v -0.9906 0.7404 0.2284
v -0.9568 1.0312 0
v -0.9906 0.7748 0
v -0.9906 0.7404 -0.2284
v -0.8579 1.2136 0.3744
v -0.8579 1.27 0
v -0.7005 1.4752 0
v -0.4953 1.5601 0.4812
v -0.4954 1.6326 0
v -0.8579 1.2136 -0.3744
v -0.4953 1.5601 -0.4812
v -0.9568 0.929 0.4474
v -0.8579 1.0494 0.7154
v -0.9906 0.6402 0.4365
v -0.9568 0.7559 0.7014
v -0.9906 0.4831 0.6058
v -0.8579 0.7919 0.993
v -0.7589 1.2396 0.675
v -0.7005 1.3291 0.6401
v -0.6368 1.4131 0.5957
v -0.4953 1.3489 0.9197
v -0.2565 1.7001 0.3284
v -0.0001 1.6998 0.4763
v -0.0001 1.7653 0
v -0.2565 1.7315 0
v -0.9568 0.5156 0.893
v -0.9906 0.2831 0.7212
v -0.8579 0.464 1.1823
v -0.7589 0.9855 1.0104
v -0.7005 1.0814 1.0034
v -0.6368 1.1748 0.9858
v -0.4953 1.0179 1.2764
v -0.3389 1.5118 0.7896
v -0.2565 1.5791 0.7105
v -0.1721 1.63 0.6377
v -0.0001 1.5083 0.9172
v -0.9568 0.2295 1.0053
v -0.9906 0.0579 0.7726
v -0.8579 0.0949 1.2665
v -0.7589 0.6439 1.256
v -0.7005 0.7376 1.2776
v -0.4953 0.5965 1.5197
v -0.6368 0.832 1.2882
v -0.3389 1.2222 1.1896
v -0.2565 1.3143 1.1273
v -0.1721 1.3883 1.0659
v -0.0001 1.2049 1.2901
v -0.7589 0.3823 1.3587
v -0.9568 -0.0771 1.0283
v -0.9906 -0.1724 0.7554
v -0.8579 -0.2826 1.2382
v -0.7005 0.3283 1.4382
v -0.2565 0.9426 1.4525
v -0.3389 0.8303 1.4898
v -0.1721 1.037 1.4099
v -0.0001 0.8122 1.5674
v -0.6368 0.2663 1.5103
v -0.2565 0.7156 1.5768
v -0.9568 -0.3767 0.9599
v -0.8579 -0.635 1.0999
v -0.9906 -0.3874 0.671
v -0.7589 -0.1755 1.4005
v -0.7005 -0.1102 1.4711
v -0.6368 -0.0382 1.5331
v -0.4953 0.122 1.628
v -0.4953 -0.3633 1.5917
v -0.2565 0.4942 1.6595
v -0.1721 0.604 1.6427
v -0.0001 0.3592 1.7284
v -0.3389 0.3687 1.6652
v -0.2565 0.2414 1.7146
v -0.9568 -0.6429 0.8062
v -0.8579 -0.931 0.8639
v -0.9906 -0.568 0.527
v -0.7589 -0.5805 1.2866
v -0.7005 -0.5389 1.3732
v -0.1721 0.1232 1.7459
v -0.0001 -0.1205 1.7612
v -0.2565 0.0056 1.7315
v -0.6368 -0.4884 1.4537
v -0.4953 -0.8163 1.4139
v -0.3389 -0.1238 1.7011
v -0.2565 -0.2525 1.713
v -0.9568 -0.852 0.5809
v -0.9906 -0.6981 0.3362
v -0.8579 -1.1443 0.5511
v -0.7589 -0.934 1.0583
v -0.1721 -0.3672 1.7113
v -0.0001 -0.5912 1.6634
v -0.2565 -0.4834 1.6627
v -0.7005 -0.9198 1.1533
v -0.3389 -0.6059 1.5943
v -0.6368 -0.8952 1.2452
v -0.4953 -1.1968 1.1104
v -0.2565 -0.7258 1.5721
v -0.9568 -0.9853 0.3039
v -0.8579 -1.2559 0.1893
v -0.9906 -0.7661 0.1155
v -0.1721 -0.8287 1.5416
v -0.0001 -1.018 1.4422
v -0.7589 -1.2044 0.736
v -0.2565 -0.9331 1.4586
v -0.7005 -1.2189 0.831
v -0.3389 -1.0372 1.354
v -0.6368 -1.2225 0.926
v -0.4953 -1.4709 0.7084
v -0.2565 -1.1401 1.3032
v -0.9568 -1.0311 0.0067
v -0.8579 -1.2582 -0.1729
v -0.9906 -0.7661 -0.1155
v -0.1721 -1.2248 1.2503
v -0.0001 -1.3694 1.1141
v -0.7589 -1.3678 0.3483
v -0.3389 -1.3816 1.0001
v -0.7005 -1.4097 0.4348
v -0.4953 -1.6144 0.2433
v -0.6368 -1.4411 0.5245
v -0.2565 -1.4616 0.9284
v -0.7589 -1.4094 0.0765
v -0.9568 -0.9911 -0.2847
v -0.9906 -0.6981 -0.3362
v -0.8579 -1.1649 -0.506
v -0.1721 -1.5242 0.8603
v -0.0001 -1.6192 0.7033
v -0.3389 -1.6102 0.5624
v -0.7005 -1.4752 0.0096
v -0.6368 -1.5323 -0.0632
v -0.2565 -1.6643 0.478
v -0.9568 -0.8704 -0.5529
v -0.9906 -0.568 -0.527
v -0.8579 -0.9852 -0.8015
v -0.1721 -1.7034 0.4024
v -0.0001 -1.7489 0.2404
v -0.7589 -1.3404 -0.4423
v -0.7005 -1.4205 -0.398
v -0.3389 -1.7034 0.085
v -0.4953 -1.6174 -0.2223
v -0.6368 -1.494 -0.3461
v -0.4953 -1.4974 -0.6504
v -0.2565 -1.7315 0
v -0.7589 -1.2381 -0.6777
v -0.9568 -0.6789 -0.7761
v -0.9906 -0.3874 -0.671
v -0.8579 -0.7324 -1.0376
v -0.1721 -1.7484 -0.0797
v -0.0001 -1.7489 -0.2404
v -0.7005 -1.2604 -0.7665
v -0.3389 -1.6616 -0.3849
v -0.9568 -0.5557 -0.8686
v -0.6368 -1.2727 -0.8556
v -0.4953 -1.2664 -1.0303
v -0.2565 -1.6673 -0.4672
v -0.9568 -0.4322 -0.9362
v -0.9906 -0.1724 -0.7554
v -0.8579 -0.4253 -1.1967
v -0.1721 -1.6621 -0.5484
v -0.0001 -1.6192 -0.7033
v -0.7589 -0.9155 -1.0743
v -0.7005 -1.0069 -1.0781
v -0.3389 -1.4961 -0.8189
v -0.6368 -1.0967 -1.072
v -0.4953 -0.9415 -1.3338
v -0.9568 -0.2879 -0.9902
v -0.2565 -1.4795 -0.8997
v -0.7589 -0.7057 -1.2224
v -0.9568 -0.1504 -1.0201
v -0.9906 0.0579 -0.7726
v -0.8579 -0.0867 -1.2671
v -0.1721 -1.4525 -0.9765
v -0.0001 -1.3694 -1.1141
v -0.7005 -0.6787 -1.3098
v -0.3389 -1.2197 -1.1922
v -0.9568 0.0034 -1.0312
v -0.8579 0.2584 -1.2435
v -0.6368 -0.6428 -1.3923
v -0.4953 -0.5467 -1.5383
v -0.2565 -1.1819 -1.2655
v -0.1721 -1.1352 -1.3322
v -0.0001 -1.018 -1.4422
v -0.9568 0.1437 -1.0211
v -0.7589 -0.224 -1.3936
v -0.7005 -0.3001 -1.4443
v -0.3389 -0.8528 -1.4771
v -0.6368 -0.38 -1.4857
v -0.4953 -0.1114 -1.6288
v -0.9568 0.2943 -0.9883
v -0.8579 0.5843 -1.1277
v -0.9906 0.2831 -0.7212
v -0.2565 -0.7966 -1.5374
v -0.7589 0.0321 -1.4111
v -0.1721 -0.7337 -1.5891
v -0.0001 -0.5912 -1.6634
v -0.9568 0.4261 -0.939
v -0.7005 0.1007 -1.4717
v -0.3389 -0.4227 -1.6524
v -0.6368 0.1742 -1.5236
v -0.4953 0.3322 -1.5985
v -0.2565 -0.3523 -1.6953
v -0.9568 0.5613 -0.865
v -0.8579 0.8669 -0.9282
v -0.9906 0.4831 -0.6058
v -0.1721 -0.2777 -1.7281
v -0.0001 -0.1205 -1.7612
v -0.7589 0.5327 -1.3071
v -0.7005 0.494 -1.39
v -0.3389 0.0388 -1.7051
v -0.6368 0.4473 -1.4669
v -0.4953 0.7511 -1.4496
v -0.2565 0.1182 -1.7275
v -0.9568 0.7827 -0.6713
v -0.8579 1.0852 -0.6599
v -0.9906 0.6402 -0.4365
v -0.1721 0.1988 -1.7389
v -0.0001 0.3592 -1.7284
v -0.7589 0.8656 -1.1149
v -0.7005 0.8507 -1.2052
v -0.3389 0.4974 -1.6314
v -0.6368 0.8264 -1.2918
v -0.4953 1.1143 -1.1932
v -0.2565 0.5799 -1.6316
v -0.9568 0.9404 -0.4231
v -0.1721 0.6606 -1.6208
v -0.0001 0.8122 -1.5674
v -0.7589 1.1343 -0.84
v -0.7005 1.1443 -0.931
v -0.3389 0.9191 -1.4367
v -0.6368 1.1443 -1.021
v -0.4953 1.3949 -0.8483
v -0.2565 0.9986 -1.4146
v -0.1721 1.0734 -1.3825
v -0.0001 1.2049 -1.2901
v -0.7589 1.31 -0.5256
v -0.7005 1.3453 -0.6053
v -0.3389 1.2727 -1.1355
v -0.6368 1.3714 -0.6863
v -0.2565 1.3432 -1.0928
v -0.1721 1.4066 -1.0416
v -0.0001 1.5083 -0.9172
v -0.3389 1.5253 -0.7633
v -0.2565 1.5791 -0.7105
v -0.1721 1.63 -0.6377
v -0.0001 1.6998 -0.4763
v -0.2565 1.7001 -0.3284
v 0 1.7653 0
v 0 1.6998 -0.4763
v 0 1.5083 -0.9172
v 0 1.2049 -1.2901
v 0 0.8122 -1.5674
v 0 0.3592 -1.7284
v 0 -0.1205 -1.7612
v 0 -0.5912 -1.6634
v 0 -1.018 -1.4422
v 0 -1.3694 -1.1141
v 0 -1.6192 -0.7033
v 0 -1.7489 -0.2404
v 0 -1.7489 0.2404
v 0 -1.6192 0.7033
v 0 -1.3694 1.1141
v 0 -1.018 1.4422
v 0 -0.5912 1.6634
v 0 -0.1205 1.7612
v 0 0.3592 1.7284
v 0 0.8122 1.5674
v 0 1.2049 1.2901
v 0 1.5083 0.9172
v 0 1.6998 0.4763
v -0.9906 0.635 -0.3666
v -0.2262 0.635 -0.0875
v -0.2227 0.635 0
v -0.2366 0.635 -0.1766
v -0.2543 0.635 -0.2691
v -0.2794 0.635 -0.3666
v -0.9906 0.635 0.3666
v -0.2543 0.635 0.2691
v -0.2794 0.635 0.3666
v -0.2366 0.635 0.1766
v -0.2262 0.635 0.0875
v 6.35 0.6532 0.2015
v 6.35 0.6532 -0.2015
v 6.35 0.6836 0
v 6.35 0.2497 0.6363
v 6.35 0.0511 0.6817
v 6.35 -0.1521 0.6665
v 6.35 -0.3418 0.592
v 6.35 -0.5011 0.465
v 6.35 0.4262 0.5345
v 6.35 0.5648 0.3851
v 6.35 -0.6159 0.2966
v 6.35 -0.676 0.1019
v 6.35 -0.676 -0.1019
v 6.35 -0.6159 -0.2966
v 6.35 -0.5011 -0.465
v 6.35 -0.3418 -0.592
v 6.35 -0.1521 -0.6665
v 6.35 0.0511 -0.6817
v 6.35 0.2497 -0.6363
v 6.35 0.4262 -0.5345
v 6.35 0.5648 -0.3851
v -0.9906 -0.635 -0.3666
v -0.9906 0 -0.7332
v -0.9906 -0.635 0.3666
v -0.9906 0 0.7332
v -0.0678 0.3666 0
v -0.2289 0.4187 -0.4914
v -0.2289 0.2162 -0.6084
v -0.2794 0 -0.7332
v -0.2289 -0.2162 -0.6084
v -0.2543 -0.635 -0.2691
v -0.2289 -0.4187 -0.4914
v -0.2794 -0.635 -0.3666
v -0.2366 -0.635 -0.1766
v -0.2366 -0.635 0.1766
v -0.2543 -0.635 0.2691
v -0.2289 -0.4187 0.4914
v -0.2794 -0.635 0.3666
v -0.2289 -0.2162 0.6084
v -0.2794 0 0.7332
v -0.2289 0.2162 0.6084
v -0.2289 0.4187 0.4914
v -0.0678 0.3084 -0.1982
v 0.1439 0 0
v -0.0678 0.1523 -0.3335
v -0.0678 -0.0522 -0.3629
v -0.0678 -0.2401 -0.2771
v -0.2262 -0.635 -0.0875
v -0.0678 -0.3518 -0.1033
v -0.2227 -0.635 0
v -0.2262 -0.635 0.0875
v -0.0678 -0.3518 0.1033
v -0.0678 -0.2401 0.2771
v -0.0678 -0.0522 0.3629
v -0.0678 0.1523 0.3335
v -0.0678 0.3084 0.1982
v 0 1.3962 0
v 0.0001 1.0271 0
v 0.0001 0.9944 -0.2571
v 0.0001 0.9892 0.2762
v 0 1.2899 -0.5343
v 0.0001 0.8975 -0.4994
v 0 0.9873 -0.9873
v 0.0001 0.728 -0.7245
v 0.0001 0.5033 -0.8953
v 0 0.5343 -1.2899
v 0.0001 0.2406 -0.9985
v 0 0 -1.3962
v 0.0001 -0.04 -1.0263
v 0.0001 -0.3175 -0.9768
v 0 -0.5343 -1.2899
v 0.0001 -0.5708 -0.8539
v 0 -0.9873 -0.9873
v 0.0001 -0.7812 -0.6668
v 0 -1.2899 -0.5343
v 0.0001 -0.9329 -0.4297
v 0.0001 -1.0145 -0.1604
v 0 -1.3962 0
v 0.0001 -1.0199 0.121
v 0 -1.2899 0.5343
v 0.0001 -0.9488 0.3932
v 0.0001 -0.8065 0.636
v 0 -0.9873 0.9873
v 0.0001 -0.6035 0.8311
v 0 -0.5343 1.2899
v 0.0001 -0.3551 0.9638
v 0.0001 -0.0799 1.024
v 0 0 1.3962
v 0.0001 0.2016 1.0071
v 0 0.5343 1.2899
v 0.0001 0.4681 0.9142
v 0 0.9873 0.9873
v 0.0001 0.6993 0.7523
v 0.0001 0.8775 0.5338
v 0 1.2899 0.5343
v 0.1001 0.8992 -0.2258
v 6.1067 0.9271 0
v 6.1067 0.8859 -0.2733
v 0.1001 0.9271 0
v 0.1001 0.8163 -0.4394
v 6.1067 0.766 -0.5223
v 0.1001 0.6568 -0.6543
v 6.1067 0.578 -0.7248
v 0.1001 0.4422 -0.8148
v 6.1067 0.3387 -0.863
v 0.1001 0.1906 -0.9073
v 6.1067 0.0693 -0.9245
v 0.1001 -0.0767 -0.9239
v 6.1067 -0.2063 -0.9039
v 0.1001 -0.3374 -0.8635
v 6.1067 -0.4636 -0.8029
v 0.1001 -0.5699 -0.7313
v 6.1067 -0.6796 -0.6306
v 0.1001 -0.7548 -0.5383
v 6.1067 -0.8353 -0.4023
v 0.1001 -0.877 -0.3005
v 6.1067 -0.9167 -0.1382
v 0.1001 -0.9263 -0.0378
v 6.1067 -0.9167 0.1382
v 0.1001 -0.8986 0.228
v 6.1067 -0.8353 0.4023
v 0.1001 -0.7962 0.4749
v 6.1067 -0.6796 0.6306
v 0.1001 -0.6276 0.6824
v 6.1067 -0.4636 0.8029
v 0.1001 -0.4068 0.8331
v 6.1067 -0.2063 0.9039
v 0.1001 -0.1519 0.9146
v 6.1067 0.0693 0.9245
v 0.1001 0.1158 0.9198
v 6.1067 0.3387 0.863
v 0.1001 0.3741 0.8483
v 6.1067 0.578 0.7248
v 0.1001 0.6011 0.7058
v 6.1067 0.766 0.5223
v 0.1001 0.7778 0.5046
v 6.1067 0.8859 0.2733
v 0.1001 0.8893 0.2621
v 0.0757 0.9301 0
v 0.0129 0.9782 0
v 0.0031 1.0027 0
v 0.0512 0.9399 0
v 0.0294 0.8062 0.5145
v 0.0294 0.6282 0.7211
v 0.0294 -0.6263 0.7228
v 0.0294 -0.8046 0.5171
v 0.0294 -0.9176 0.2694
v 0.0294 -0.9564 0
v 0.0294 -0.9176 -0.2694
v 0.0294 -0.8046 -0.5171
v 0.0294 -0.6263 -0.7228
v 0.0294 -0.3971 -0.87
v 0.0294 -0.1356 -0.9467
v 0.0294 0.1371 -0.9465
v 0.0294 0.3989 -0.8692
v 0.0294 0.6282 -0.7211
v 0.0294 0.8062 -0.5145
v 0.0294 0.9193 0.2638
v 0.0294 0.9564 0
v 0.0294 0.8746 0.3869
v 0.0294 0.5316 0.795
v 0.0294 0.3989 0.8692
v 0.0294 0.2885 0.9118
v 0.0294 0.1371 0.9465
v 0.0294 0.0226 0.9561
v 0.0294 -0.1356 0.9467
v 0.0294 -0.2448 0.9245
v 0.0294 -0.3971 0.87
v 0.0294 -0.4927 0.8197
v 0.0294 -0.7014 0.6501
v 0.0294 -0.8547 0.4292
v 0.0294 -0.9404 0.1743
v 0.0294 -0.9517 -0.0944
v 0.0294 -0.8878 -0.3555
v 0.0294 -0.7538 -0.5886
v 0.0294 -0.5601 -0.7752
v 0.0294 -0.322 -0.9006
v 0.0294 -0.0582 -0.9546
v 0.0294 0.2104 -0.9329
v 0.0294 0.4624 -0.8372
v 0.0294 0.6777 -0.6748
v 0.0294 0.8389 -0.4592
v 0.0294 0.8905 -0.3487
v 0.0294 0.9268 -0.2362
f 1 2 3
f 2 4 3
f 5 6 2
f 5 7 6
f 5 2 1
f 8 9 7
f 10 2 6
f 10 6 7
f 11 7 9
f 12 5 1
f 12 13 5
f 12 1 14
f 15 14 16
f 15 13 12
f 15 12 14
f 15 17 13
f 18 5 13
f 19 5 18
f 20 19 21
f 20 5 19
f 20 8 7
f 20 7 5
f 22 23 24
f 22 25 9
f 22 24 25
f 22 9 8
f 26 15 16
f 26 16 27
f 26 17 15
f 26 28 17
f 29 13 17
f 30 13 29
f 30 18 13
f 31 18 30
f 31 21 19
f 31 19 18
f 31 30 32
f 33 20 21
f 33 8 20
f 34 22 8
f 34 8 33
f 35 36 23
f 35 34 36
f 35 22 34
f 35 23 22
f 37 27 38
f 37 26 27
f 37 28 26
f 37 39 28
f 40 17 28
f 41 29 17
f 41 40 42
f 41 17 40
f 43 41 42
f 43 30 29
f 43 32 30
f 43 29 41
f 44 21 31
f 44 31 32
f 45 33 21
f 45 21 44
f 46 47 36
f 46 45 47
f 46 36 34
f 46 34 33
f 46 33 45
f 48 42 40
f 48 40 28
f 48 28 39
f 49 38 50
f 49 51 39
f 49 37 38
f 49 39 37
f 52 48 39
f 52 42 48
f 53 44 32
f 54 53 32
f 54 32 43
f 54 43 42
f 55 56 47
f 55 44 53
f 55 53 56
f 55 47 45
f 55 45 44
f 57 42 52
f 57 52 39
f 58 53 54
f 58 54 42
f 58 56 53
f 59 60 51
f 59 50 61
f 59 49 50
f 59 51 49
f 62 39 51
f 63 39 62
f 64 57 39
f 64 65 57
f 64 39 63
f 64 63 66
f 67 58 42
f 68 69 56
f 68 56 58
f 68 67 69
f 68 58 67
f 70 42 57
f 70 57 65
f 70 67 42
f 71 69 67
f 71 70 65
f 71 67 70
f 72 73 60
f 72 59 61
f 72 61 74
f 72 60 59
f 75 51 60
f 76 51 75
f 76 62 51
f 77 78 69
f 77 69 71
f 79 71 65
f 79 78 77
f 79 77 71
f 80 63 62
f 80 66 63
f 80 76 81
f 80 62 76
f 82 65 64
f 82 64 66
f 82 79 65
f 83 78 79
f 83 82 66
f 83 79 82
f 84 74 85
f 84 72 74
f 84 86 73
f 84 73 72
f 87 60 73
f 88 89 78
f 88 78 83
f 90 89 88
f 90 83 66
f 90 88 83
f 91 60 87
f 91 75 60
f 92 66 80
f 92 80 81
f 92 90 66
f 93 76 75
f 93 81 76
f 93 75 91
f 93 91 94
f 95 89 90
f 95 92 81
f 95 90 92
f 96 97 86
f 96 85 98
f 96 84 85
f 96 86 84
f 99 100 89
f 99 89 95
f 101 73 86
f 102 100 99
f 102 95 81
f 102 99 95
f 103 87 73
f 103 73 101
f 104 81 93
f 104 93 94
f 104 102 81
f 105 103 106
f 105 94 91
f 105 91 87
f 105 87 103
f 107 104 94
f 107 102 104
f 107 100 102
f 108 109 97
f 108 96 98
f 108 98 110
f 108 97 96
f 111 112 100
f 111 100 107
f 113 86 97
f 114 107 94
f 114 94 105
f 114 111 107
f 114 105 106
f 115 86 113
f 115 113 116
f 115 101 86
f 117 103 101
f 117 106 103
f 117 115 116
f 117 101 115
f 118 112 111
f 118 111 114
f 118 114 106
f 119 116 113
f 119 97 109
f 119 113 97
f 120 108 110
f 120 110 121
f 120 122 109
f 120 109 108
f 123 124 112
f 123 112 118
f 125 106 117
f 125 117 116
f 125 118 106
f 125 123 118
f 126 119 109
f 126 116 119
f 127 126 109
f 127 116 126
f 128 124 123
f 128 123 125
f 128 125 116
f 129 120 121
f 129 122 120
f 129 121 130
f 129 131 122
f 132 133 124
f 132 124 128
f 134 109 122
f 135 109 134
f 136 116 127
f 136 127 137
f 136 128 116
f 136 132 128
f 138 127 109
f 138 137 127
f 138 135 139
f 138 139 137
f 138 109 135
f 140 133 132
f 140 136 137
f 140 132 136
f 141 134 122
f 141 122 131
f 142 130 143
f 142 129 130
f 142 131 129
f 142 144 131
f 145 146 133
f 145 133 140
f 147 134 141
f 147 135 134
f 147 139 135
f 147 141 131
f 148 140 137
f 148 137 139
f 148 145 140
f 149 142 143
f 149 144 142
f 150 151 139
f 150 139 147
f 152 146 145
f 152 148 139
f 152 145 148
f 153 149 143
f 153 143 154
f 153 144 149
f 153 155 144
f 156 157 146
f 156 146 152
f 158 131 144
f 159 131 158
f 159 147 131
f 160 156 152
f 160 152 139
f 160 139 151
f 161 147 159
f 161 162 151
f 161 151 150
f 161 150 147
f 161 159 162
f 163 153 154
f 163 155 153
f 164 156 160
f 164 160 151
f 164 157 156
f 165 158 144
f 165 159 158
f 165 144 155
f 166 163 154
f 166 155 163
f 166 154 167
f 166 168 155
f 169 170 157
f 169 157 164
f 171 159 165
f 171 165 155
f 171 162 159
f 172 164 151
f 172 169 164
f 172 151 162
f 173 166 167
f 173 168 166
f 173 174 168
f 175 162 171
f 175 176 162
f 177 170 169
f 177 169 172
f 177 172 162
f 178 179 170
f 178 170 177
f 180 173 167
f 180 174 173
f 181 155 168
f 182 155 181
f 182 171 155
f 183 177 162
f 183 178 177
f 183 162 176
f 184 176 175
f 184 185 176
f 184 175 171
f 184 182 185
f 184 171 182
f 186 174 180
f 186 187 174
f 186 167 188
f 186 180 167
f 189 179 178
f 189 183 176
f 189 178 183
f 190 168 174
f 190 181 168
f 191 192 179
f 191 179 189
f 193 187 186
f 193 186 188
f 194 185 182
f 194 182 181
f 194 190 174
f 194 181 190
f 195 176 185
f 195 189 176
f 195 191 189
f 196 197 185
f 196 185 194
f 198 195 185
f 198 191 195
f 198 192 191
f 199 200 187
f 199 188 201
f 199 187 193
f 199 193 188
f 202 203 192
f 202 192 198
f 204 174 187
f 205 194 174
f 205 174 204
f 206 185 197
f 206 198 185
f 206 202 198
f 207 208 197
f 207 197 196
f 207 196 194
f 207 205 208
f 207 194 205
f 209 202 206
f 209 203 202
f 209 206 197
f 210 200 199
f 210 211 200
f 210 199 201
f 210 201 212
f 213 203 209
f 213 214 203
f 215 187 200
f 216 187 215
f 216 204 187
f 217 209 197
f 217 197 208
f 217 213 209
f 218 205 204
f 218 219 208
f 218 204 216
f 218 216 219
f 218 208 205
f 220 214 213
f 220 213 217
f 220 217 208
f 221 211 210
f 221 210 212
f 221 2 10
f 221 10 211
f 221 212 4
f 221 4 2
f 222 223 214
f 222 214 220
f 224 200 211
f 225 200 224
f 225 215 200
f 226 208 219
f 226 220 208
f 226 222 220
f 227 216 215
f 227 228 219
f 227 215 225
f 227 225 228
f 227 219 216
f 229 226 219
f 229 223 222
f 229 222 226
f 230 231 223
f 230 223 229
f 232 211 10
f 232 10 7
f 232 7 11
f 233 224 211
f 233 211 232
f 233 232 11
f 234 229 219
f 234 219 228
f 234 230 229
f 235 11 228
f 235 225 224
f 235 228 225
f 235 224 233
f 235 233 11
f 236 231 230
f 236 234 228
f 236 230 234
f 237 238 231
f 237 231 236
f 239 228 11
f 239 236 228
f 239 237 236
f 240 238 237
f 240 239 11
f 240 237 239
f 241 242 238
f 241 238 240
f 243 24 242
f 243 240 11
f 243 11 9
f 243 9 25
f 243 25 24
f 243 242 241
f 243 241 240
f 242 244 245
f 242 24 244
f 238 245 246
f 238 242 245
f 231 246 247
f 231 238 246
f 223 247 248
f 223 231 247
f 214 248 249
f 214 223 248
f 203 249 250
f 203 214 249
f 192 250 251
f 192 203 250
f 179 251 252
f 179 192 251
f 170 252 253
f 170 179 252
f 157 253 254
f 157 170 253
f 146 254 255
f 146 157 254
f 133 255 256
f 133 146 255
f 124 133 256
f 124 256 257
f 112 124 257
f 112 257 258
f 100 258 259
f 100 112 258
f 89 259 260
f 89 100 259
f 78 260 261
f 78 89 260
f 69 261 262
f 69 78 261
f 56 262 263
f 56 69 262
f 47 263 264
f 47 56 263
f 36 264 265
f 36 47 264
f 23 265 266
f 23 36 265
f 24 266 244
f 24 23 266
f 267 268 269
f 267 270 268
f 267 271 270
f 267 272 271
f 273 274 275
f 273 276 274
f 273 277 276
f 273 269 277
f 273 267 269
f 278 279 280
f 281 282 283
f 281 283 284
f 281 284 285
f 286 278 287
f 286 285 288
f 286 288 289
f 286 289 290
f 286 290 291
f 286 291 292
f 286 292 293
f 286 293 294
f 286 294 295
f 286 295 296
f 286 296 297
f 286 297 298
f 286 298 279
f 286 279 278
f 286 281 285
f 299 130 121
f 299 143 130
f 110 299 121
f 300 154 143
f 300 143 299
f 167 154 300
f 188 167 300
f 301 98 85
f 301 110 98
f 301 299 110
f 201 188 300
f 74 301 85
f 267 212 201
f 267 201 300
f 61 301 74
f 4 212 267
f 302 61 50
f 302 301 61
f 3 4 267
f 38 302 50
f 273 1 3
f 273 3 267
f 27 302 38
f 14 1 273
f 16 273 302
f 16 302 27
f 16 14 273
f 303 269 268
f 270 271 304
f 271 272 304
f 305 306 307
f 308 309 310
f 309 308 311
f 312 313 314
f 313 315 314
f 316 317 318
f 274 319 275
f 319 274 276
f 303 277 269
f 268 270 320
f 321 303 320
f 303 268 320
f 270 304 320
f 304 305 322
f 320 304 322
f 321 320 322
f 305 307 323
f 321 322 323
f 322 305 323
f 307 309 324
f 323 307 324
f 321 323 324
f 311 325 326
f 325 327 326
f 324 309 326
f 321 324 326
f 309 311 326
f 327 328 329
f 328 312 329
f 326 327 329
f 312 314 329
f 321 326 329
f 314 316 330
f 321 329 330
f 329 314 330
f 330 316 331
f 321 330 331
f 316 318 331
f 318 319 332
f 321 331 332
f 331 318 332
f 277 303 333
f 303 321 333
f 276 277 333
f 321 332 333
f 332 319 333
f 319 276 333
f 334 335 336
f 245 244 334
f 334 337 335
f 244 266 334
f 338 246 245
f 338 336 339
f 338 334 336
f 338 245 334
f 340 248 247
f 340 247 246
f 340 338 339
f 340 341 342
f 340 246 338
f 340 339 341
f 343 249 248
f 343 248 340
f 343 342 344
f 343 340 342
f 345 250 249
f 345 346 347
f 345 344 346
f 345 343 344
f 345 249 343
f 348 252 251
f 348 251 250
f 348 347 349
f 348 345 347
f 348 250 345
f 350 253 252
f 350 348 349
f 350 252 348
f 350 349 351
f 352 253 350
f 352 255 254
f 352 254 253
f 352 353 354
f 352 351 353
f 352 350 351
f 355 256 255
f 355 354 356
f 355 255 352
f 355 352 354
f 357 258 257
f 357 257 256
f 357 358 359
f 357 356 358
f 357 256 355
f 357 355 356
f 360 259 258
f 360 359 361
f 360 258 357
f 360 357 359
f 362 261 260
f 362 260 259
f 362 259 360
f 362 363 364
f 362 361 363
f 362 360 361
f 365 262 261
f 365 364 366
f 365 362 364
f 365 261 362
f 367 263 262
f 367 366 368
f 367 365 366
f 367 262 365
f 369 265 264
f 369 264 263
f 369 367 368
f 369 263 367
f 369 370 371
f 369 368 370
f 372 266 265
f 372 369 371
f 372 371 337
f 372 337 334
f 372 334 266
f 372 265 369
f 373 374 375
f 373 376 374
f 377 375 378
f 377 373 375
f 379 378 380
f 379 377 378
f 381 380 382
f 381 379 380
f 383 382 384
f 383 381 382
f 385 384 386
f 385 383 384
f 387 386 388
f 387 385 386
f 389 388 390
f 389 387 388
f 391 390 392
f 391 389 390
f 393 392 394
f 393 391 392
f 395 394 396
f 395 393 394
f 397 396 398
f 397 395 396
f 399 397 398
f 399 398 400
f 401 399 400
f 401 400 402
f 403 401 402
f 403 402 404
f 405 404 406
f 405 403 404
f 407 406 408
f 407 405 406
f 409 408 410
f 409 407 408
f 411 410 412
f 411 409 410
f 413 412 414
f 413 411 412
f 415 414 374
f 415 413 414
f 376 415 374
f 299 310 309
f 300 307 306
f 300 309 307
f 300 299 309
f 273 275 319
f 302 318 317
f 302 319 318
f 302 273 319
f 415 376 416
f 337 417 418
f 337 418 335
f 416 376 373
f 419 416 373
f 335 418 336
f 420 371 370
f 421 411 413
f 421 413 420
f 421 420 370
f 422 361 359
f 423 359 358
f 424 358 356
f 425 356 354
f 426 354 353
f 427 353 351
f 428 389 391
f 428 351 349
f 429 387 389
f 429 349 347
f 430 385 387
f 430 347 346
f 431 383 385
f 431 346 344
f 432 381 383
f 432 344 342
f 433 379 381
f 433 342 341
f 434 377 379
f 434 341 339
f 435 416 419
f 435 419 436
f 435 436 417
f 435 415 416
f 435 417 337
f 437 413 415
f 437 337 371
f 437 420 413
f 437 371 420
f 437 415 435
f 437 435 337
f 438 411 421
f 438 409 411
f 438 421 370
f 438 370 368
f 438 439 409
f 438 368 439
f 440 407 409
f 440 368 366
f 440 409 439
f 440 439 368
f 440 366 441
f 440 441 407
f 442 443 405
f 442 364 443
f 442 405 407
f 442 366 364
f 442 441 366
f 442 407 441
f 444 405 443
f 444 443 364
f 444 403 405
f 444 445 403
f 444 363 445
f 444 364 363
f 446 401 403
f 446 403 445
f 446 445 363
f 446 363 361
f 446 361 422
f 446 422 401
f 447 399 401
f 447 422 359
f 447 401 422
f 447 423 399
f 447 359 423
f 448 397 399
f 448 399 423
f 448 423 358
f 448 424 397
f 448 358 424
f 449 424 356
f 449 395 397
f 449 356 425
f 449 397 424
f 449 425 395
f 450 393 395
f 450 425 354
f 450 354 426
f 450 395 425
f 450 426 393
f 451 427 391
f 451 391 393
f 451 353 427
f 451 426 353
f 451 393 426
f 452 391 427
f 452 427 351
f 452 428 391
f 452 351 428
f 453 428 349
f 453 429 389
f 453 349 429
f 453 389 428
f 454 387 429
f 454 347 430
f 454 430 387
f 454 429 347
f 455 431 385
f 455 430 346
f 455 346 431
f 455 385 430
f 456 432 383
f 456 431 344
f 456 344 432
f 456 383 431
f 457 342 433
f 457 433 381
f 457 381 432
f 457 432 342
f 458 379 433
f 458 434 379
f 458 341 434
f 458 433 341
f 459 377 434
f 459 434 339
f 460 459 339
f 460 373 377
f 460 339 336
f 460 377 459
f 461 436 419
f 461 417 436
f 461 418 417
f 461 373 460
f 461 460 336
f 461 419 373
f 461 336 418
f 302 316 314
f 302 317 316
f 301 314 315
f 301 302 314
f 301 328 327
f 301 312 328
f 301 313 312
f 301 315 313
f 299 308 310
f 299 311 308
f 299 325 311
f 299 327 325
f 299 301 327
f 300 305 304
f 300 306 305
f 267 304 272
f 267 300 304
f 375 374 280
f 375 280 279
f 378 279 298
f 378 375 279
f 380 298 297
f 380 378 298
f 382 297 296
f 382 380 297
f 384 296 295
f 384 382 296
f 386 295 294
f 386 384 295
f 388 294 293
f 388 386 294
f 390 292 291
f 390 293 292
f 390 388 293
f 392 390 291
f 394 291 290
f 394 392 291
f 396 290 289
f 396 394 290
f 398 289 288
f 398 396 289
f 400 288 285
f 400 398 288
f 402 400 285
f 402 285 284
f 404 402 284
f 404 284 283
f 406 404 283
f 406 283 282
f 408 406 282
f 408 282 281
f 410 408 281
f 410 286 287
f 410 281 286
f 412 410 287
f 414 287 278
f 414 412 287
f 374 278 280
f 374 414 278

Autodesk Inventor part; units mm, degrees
ref_plane "YZ Plane" through (0, 0, 0) normal (1, 0, 0) x (0, 1, 0)
ref_plane "XZ Plane" through (0, 0, 0) normal (0, 1, 0) x (-1, 0, 0)
sketch "Sketch1" plane through (0, 0, 0) normal (0, 0, 1) x (1, 0, 0)
  line L0 (0.1439, 0) -> (6.35, 0)
  line L1 (6.35, 0) -> (6.35, 0.9271)
  line L2 (6.35, 0.9271) -> (0.7927, 0.9271)
  line L3 (0.7927, 0.9271) -> (0.0001, 0.9271)
  line L4 (0.0001, 0.9271) -> (0, 0.9271)
  line L5 (0, 0.9271) -> (0, 1.7653)
  line L6 (0, 1.7653) -> (-0.9906, 1.7653)
  line L7 (-0.9906, 1.7653) -> (-0.9906, 0.7332)
  line L8 (-0.9906, 0.7332) -> (-0.2794, 0.7332)
  line L9 (-0.2794, 0.7332) -> (0.1439, 0)
  line L10 (-2.4587, 0) -> (7.8181, 0) projected
  line L11 (0, -0.3531) -> (0, 2.1184) projected
  line L12 (0.7927, 0.9271) -> (0, 0.9271) construction
  dimension "d1" = 5.5573
  dimension "d2" = 0.7926
  dimension "d3" = 0.9906
  dimension "d4" = 0.7112
  dimension "d5" = 60
  dimension "d6" = 1.8542
  dimension "d7" = 1.8542
  dimension "d8" = 1.4665
  dimension "d9" = 3.5306
  dimension "d26" = 6.35
revolve "Body" add sketch "Sketch1" angle 360 about axis through (0.1439, 0, 0) along (1, 0, 0) contours L9 L11 L3 L2 L1 L0 | L9 L8 L7 L6 L5 L11
sketch "Sketch2" plane through (-0.9906, 0, 0) normal (-1, 0, 0) x (0, 0, 1)
  circle A0 centre (0, 0) radius 0.7332 projected
  line L0 (0, -2.4714) -> (0, 2.4714) projected
  line L1 (-2.4714, 0) -> (2.4714, 0) projected
  line L2 (0.7332, 0) -> (0.3666, -0.635)
  line L3 (0.3666, -0.635) -> (-0.3666, -0.635)
  line L4 (-0.3666, -0.635) -> (-0.7332, 0)
  line L5 (-0.7332, 0) -> (-0.3666, 0.635)
  line L6 (-0.3666, 0.635) -> (0.3666, 0.635)
  line L7 (0.3666, 0.635) -> (0.7332, 0)
  point P0 (0, 0)
extrude "Slot" add sketch "Sketch2" against normal up to next contours L7 A0 | A0 L2 | L6 L0 A0 | A0 L0 L3 | L0 L6 A0 | A0 L3 L0 | L4 A0 | A0 L5
fillet "Fillet1" radius 0.9905 1 edges at (-0.9906, -1.7653, 0)
thread "Thread" size "1-64 UNC" class "2A" standard "ANSI Unified Screw Threads" length 5.5573
chamfer "Chamfer1" distance 0.2435 distance2 0.2433 1 edges at (6.35, -0.9271, 0) measured on face at (6.35, -0.6833, -0.2193)
ref_plane "Work Plane1" through (29, 0, 0) normal (0, -1, 0) x (1, 0, 0)
fillet "Fillet2" radius 0.1 1 edges at (0.0001, -0.9271, 0)
equation "\"d1\" = GEL"
equation "\"d3\" = KOH"
equation "\"d4\" = INTI"
equation "\"d6\" = GD"
equation "\"d7\" = BDM"
equation "\"d8\" = 1.1547 * SW"
equation "\"d9\" = KOD"
equation "\"d26\" = NLG"
equation "\"d30\" = R"
equation "\"d17\" = RR"
equation "\"d13\" = GEL"
equation "\"d15\" = -0.5 * SPD + 0.5 * GD"
equation "\"d16\" = GUL"
equation "\"GD\" = NND"
equation "\"NLG\" = 6.35"
equation "\"GEL\" = 5.55732"
equation "\"KOD\" = 3.5306"
equation "\"KOH\" = 0.9906"
equation "\"INTI\" = 0.7112"
equation "\"GAL\" = 0.79248"
equation "\"GUL\" = 0.24333"
equation "\"BDM\" = NND"
equation "\"SW\" = 1.27"
equation "\"RR\" = 0.9905"
equation "\"SPD\" = 1.36728"
equation "\"R\" = 0.1"
equation "\"TOA\" = 30deg"
equation "\"GD1\" = SPD"
equation "\"THREADDIA\" = 1.8542"
equation "\"KOH1\" = 0.254"
equation "\"NND\" = 1.8542"
equation "\"E0\" = 1.46685"
properties part number "ANSI B18.3 - 1 - 64 x 1/4"
